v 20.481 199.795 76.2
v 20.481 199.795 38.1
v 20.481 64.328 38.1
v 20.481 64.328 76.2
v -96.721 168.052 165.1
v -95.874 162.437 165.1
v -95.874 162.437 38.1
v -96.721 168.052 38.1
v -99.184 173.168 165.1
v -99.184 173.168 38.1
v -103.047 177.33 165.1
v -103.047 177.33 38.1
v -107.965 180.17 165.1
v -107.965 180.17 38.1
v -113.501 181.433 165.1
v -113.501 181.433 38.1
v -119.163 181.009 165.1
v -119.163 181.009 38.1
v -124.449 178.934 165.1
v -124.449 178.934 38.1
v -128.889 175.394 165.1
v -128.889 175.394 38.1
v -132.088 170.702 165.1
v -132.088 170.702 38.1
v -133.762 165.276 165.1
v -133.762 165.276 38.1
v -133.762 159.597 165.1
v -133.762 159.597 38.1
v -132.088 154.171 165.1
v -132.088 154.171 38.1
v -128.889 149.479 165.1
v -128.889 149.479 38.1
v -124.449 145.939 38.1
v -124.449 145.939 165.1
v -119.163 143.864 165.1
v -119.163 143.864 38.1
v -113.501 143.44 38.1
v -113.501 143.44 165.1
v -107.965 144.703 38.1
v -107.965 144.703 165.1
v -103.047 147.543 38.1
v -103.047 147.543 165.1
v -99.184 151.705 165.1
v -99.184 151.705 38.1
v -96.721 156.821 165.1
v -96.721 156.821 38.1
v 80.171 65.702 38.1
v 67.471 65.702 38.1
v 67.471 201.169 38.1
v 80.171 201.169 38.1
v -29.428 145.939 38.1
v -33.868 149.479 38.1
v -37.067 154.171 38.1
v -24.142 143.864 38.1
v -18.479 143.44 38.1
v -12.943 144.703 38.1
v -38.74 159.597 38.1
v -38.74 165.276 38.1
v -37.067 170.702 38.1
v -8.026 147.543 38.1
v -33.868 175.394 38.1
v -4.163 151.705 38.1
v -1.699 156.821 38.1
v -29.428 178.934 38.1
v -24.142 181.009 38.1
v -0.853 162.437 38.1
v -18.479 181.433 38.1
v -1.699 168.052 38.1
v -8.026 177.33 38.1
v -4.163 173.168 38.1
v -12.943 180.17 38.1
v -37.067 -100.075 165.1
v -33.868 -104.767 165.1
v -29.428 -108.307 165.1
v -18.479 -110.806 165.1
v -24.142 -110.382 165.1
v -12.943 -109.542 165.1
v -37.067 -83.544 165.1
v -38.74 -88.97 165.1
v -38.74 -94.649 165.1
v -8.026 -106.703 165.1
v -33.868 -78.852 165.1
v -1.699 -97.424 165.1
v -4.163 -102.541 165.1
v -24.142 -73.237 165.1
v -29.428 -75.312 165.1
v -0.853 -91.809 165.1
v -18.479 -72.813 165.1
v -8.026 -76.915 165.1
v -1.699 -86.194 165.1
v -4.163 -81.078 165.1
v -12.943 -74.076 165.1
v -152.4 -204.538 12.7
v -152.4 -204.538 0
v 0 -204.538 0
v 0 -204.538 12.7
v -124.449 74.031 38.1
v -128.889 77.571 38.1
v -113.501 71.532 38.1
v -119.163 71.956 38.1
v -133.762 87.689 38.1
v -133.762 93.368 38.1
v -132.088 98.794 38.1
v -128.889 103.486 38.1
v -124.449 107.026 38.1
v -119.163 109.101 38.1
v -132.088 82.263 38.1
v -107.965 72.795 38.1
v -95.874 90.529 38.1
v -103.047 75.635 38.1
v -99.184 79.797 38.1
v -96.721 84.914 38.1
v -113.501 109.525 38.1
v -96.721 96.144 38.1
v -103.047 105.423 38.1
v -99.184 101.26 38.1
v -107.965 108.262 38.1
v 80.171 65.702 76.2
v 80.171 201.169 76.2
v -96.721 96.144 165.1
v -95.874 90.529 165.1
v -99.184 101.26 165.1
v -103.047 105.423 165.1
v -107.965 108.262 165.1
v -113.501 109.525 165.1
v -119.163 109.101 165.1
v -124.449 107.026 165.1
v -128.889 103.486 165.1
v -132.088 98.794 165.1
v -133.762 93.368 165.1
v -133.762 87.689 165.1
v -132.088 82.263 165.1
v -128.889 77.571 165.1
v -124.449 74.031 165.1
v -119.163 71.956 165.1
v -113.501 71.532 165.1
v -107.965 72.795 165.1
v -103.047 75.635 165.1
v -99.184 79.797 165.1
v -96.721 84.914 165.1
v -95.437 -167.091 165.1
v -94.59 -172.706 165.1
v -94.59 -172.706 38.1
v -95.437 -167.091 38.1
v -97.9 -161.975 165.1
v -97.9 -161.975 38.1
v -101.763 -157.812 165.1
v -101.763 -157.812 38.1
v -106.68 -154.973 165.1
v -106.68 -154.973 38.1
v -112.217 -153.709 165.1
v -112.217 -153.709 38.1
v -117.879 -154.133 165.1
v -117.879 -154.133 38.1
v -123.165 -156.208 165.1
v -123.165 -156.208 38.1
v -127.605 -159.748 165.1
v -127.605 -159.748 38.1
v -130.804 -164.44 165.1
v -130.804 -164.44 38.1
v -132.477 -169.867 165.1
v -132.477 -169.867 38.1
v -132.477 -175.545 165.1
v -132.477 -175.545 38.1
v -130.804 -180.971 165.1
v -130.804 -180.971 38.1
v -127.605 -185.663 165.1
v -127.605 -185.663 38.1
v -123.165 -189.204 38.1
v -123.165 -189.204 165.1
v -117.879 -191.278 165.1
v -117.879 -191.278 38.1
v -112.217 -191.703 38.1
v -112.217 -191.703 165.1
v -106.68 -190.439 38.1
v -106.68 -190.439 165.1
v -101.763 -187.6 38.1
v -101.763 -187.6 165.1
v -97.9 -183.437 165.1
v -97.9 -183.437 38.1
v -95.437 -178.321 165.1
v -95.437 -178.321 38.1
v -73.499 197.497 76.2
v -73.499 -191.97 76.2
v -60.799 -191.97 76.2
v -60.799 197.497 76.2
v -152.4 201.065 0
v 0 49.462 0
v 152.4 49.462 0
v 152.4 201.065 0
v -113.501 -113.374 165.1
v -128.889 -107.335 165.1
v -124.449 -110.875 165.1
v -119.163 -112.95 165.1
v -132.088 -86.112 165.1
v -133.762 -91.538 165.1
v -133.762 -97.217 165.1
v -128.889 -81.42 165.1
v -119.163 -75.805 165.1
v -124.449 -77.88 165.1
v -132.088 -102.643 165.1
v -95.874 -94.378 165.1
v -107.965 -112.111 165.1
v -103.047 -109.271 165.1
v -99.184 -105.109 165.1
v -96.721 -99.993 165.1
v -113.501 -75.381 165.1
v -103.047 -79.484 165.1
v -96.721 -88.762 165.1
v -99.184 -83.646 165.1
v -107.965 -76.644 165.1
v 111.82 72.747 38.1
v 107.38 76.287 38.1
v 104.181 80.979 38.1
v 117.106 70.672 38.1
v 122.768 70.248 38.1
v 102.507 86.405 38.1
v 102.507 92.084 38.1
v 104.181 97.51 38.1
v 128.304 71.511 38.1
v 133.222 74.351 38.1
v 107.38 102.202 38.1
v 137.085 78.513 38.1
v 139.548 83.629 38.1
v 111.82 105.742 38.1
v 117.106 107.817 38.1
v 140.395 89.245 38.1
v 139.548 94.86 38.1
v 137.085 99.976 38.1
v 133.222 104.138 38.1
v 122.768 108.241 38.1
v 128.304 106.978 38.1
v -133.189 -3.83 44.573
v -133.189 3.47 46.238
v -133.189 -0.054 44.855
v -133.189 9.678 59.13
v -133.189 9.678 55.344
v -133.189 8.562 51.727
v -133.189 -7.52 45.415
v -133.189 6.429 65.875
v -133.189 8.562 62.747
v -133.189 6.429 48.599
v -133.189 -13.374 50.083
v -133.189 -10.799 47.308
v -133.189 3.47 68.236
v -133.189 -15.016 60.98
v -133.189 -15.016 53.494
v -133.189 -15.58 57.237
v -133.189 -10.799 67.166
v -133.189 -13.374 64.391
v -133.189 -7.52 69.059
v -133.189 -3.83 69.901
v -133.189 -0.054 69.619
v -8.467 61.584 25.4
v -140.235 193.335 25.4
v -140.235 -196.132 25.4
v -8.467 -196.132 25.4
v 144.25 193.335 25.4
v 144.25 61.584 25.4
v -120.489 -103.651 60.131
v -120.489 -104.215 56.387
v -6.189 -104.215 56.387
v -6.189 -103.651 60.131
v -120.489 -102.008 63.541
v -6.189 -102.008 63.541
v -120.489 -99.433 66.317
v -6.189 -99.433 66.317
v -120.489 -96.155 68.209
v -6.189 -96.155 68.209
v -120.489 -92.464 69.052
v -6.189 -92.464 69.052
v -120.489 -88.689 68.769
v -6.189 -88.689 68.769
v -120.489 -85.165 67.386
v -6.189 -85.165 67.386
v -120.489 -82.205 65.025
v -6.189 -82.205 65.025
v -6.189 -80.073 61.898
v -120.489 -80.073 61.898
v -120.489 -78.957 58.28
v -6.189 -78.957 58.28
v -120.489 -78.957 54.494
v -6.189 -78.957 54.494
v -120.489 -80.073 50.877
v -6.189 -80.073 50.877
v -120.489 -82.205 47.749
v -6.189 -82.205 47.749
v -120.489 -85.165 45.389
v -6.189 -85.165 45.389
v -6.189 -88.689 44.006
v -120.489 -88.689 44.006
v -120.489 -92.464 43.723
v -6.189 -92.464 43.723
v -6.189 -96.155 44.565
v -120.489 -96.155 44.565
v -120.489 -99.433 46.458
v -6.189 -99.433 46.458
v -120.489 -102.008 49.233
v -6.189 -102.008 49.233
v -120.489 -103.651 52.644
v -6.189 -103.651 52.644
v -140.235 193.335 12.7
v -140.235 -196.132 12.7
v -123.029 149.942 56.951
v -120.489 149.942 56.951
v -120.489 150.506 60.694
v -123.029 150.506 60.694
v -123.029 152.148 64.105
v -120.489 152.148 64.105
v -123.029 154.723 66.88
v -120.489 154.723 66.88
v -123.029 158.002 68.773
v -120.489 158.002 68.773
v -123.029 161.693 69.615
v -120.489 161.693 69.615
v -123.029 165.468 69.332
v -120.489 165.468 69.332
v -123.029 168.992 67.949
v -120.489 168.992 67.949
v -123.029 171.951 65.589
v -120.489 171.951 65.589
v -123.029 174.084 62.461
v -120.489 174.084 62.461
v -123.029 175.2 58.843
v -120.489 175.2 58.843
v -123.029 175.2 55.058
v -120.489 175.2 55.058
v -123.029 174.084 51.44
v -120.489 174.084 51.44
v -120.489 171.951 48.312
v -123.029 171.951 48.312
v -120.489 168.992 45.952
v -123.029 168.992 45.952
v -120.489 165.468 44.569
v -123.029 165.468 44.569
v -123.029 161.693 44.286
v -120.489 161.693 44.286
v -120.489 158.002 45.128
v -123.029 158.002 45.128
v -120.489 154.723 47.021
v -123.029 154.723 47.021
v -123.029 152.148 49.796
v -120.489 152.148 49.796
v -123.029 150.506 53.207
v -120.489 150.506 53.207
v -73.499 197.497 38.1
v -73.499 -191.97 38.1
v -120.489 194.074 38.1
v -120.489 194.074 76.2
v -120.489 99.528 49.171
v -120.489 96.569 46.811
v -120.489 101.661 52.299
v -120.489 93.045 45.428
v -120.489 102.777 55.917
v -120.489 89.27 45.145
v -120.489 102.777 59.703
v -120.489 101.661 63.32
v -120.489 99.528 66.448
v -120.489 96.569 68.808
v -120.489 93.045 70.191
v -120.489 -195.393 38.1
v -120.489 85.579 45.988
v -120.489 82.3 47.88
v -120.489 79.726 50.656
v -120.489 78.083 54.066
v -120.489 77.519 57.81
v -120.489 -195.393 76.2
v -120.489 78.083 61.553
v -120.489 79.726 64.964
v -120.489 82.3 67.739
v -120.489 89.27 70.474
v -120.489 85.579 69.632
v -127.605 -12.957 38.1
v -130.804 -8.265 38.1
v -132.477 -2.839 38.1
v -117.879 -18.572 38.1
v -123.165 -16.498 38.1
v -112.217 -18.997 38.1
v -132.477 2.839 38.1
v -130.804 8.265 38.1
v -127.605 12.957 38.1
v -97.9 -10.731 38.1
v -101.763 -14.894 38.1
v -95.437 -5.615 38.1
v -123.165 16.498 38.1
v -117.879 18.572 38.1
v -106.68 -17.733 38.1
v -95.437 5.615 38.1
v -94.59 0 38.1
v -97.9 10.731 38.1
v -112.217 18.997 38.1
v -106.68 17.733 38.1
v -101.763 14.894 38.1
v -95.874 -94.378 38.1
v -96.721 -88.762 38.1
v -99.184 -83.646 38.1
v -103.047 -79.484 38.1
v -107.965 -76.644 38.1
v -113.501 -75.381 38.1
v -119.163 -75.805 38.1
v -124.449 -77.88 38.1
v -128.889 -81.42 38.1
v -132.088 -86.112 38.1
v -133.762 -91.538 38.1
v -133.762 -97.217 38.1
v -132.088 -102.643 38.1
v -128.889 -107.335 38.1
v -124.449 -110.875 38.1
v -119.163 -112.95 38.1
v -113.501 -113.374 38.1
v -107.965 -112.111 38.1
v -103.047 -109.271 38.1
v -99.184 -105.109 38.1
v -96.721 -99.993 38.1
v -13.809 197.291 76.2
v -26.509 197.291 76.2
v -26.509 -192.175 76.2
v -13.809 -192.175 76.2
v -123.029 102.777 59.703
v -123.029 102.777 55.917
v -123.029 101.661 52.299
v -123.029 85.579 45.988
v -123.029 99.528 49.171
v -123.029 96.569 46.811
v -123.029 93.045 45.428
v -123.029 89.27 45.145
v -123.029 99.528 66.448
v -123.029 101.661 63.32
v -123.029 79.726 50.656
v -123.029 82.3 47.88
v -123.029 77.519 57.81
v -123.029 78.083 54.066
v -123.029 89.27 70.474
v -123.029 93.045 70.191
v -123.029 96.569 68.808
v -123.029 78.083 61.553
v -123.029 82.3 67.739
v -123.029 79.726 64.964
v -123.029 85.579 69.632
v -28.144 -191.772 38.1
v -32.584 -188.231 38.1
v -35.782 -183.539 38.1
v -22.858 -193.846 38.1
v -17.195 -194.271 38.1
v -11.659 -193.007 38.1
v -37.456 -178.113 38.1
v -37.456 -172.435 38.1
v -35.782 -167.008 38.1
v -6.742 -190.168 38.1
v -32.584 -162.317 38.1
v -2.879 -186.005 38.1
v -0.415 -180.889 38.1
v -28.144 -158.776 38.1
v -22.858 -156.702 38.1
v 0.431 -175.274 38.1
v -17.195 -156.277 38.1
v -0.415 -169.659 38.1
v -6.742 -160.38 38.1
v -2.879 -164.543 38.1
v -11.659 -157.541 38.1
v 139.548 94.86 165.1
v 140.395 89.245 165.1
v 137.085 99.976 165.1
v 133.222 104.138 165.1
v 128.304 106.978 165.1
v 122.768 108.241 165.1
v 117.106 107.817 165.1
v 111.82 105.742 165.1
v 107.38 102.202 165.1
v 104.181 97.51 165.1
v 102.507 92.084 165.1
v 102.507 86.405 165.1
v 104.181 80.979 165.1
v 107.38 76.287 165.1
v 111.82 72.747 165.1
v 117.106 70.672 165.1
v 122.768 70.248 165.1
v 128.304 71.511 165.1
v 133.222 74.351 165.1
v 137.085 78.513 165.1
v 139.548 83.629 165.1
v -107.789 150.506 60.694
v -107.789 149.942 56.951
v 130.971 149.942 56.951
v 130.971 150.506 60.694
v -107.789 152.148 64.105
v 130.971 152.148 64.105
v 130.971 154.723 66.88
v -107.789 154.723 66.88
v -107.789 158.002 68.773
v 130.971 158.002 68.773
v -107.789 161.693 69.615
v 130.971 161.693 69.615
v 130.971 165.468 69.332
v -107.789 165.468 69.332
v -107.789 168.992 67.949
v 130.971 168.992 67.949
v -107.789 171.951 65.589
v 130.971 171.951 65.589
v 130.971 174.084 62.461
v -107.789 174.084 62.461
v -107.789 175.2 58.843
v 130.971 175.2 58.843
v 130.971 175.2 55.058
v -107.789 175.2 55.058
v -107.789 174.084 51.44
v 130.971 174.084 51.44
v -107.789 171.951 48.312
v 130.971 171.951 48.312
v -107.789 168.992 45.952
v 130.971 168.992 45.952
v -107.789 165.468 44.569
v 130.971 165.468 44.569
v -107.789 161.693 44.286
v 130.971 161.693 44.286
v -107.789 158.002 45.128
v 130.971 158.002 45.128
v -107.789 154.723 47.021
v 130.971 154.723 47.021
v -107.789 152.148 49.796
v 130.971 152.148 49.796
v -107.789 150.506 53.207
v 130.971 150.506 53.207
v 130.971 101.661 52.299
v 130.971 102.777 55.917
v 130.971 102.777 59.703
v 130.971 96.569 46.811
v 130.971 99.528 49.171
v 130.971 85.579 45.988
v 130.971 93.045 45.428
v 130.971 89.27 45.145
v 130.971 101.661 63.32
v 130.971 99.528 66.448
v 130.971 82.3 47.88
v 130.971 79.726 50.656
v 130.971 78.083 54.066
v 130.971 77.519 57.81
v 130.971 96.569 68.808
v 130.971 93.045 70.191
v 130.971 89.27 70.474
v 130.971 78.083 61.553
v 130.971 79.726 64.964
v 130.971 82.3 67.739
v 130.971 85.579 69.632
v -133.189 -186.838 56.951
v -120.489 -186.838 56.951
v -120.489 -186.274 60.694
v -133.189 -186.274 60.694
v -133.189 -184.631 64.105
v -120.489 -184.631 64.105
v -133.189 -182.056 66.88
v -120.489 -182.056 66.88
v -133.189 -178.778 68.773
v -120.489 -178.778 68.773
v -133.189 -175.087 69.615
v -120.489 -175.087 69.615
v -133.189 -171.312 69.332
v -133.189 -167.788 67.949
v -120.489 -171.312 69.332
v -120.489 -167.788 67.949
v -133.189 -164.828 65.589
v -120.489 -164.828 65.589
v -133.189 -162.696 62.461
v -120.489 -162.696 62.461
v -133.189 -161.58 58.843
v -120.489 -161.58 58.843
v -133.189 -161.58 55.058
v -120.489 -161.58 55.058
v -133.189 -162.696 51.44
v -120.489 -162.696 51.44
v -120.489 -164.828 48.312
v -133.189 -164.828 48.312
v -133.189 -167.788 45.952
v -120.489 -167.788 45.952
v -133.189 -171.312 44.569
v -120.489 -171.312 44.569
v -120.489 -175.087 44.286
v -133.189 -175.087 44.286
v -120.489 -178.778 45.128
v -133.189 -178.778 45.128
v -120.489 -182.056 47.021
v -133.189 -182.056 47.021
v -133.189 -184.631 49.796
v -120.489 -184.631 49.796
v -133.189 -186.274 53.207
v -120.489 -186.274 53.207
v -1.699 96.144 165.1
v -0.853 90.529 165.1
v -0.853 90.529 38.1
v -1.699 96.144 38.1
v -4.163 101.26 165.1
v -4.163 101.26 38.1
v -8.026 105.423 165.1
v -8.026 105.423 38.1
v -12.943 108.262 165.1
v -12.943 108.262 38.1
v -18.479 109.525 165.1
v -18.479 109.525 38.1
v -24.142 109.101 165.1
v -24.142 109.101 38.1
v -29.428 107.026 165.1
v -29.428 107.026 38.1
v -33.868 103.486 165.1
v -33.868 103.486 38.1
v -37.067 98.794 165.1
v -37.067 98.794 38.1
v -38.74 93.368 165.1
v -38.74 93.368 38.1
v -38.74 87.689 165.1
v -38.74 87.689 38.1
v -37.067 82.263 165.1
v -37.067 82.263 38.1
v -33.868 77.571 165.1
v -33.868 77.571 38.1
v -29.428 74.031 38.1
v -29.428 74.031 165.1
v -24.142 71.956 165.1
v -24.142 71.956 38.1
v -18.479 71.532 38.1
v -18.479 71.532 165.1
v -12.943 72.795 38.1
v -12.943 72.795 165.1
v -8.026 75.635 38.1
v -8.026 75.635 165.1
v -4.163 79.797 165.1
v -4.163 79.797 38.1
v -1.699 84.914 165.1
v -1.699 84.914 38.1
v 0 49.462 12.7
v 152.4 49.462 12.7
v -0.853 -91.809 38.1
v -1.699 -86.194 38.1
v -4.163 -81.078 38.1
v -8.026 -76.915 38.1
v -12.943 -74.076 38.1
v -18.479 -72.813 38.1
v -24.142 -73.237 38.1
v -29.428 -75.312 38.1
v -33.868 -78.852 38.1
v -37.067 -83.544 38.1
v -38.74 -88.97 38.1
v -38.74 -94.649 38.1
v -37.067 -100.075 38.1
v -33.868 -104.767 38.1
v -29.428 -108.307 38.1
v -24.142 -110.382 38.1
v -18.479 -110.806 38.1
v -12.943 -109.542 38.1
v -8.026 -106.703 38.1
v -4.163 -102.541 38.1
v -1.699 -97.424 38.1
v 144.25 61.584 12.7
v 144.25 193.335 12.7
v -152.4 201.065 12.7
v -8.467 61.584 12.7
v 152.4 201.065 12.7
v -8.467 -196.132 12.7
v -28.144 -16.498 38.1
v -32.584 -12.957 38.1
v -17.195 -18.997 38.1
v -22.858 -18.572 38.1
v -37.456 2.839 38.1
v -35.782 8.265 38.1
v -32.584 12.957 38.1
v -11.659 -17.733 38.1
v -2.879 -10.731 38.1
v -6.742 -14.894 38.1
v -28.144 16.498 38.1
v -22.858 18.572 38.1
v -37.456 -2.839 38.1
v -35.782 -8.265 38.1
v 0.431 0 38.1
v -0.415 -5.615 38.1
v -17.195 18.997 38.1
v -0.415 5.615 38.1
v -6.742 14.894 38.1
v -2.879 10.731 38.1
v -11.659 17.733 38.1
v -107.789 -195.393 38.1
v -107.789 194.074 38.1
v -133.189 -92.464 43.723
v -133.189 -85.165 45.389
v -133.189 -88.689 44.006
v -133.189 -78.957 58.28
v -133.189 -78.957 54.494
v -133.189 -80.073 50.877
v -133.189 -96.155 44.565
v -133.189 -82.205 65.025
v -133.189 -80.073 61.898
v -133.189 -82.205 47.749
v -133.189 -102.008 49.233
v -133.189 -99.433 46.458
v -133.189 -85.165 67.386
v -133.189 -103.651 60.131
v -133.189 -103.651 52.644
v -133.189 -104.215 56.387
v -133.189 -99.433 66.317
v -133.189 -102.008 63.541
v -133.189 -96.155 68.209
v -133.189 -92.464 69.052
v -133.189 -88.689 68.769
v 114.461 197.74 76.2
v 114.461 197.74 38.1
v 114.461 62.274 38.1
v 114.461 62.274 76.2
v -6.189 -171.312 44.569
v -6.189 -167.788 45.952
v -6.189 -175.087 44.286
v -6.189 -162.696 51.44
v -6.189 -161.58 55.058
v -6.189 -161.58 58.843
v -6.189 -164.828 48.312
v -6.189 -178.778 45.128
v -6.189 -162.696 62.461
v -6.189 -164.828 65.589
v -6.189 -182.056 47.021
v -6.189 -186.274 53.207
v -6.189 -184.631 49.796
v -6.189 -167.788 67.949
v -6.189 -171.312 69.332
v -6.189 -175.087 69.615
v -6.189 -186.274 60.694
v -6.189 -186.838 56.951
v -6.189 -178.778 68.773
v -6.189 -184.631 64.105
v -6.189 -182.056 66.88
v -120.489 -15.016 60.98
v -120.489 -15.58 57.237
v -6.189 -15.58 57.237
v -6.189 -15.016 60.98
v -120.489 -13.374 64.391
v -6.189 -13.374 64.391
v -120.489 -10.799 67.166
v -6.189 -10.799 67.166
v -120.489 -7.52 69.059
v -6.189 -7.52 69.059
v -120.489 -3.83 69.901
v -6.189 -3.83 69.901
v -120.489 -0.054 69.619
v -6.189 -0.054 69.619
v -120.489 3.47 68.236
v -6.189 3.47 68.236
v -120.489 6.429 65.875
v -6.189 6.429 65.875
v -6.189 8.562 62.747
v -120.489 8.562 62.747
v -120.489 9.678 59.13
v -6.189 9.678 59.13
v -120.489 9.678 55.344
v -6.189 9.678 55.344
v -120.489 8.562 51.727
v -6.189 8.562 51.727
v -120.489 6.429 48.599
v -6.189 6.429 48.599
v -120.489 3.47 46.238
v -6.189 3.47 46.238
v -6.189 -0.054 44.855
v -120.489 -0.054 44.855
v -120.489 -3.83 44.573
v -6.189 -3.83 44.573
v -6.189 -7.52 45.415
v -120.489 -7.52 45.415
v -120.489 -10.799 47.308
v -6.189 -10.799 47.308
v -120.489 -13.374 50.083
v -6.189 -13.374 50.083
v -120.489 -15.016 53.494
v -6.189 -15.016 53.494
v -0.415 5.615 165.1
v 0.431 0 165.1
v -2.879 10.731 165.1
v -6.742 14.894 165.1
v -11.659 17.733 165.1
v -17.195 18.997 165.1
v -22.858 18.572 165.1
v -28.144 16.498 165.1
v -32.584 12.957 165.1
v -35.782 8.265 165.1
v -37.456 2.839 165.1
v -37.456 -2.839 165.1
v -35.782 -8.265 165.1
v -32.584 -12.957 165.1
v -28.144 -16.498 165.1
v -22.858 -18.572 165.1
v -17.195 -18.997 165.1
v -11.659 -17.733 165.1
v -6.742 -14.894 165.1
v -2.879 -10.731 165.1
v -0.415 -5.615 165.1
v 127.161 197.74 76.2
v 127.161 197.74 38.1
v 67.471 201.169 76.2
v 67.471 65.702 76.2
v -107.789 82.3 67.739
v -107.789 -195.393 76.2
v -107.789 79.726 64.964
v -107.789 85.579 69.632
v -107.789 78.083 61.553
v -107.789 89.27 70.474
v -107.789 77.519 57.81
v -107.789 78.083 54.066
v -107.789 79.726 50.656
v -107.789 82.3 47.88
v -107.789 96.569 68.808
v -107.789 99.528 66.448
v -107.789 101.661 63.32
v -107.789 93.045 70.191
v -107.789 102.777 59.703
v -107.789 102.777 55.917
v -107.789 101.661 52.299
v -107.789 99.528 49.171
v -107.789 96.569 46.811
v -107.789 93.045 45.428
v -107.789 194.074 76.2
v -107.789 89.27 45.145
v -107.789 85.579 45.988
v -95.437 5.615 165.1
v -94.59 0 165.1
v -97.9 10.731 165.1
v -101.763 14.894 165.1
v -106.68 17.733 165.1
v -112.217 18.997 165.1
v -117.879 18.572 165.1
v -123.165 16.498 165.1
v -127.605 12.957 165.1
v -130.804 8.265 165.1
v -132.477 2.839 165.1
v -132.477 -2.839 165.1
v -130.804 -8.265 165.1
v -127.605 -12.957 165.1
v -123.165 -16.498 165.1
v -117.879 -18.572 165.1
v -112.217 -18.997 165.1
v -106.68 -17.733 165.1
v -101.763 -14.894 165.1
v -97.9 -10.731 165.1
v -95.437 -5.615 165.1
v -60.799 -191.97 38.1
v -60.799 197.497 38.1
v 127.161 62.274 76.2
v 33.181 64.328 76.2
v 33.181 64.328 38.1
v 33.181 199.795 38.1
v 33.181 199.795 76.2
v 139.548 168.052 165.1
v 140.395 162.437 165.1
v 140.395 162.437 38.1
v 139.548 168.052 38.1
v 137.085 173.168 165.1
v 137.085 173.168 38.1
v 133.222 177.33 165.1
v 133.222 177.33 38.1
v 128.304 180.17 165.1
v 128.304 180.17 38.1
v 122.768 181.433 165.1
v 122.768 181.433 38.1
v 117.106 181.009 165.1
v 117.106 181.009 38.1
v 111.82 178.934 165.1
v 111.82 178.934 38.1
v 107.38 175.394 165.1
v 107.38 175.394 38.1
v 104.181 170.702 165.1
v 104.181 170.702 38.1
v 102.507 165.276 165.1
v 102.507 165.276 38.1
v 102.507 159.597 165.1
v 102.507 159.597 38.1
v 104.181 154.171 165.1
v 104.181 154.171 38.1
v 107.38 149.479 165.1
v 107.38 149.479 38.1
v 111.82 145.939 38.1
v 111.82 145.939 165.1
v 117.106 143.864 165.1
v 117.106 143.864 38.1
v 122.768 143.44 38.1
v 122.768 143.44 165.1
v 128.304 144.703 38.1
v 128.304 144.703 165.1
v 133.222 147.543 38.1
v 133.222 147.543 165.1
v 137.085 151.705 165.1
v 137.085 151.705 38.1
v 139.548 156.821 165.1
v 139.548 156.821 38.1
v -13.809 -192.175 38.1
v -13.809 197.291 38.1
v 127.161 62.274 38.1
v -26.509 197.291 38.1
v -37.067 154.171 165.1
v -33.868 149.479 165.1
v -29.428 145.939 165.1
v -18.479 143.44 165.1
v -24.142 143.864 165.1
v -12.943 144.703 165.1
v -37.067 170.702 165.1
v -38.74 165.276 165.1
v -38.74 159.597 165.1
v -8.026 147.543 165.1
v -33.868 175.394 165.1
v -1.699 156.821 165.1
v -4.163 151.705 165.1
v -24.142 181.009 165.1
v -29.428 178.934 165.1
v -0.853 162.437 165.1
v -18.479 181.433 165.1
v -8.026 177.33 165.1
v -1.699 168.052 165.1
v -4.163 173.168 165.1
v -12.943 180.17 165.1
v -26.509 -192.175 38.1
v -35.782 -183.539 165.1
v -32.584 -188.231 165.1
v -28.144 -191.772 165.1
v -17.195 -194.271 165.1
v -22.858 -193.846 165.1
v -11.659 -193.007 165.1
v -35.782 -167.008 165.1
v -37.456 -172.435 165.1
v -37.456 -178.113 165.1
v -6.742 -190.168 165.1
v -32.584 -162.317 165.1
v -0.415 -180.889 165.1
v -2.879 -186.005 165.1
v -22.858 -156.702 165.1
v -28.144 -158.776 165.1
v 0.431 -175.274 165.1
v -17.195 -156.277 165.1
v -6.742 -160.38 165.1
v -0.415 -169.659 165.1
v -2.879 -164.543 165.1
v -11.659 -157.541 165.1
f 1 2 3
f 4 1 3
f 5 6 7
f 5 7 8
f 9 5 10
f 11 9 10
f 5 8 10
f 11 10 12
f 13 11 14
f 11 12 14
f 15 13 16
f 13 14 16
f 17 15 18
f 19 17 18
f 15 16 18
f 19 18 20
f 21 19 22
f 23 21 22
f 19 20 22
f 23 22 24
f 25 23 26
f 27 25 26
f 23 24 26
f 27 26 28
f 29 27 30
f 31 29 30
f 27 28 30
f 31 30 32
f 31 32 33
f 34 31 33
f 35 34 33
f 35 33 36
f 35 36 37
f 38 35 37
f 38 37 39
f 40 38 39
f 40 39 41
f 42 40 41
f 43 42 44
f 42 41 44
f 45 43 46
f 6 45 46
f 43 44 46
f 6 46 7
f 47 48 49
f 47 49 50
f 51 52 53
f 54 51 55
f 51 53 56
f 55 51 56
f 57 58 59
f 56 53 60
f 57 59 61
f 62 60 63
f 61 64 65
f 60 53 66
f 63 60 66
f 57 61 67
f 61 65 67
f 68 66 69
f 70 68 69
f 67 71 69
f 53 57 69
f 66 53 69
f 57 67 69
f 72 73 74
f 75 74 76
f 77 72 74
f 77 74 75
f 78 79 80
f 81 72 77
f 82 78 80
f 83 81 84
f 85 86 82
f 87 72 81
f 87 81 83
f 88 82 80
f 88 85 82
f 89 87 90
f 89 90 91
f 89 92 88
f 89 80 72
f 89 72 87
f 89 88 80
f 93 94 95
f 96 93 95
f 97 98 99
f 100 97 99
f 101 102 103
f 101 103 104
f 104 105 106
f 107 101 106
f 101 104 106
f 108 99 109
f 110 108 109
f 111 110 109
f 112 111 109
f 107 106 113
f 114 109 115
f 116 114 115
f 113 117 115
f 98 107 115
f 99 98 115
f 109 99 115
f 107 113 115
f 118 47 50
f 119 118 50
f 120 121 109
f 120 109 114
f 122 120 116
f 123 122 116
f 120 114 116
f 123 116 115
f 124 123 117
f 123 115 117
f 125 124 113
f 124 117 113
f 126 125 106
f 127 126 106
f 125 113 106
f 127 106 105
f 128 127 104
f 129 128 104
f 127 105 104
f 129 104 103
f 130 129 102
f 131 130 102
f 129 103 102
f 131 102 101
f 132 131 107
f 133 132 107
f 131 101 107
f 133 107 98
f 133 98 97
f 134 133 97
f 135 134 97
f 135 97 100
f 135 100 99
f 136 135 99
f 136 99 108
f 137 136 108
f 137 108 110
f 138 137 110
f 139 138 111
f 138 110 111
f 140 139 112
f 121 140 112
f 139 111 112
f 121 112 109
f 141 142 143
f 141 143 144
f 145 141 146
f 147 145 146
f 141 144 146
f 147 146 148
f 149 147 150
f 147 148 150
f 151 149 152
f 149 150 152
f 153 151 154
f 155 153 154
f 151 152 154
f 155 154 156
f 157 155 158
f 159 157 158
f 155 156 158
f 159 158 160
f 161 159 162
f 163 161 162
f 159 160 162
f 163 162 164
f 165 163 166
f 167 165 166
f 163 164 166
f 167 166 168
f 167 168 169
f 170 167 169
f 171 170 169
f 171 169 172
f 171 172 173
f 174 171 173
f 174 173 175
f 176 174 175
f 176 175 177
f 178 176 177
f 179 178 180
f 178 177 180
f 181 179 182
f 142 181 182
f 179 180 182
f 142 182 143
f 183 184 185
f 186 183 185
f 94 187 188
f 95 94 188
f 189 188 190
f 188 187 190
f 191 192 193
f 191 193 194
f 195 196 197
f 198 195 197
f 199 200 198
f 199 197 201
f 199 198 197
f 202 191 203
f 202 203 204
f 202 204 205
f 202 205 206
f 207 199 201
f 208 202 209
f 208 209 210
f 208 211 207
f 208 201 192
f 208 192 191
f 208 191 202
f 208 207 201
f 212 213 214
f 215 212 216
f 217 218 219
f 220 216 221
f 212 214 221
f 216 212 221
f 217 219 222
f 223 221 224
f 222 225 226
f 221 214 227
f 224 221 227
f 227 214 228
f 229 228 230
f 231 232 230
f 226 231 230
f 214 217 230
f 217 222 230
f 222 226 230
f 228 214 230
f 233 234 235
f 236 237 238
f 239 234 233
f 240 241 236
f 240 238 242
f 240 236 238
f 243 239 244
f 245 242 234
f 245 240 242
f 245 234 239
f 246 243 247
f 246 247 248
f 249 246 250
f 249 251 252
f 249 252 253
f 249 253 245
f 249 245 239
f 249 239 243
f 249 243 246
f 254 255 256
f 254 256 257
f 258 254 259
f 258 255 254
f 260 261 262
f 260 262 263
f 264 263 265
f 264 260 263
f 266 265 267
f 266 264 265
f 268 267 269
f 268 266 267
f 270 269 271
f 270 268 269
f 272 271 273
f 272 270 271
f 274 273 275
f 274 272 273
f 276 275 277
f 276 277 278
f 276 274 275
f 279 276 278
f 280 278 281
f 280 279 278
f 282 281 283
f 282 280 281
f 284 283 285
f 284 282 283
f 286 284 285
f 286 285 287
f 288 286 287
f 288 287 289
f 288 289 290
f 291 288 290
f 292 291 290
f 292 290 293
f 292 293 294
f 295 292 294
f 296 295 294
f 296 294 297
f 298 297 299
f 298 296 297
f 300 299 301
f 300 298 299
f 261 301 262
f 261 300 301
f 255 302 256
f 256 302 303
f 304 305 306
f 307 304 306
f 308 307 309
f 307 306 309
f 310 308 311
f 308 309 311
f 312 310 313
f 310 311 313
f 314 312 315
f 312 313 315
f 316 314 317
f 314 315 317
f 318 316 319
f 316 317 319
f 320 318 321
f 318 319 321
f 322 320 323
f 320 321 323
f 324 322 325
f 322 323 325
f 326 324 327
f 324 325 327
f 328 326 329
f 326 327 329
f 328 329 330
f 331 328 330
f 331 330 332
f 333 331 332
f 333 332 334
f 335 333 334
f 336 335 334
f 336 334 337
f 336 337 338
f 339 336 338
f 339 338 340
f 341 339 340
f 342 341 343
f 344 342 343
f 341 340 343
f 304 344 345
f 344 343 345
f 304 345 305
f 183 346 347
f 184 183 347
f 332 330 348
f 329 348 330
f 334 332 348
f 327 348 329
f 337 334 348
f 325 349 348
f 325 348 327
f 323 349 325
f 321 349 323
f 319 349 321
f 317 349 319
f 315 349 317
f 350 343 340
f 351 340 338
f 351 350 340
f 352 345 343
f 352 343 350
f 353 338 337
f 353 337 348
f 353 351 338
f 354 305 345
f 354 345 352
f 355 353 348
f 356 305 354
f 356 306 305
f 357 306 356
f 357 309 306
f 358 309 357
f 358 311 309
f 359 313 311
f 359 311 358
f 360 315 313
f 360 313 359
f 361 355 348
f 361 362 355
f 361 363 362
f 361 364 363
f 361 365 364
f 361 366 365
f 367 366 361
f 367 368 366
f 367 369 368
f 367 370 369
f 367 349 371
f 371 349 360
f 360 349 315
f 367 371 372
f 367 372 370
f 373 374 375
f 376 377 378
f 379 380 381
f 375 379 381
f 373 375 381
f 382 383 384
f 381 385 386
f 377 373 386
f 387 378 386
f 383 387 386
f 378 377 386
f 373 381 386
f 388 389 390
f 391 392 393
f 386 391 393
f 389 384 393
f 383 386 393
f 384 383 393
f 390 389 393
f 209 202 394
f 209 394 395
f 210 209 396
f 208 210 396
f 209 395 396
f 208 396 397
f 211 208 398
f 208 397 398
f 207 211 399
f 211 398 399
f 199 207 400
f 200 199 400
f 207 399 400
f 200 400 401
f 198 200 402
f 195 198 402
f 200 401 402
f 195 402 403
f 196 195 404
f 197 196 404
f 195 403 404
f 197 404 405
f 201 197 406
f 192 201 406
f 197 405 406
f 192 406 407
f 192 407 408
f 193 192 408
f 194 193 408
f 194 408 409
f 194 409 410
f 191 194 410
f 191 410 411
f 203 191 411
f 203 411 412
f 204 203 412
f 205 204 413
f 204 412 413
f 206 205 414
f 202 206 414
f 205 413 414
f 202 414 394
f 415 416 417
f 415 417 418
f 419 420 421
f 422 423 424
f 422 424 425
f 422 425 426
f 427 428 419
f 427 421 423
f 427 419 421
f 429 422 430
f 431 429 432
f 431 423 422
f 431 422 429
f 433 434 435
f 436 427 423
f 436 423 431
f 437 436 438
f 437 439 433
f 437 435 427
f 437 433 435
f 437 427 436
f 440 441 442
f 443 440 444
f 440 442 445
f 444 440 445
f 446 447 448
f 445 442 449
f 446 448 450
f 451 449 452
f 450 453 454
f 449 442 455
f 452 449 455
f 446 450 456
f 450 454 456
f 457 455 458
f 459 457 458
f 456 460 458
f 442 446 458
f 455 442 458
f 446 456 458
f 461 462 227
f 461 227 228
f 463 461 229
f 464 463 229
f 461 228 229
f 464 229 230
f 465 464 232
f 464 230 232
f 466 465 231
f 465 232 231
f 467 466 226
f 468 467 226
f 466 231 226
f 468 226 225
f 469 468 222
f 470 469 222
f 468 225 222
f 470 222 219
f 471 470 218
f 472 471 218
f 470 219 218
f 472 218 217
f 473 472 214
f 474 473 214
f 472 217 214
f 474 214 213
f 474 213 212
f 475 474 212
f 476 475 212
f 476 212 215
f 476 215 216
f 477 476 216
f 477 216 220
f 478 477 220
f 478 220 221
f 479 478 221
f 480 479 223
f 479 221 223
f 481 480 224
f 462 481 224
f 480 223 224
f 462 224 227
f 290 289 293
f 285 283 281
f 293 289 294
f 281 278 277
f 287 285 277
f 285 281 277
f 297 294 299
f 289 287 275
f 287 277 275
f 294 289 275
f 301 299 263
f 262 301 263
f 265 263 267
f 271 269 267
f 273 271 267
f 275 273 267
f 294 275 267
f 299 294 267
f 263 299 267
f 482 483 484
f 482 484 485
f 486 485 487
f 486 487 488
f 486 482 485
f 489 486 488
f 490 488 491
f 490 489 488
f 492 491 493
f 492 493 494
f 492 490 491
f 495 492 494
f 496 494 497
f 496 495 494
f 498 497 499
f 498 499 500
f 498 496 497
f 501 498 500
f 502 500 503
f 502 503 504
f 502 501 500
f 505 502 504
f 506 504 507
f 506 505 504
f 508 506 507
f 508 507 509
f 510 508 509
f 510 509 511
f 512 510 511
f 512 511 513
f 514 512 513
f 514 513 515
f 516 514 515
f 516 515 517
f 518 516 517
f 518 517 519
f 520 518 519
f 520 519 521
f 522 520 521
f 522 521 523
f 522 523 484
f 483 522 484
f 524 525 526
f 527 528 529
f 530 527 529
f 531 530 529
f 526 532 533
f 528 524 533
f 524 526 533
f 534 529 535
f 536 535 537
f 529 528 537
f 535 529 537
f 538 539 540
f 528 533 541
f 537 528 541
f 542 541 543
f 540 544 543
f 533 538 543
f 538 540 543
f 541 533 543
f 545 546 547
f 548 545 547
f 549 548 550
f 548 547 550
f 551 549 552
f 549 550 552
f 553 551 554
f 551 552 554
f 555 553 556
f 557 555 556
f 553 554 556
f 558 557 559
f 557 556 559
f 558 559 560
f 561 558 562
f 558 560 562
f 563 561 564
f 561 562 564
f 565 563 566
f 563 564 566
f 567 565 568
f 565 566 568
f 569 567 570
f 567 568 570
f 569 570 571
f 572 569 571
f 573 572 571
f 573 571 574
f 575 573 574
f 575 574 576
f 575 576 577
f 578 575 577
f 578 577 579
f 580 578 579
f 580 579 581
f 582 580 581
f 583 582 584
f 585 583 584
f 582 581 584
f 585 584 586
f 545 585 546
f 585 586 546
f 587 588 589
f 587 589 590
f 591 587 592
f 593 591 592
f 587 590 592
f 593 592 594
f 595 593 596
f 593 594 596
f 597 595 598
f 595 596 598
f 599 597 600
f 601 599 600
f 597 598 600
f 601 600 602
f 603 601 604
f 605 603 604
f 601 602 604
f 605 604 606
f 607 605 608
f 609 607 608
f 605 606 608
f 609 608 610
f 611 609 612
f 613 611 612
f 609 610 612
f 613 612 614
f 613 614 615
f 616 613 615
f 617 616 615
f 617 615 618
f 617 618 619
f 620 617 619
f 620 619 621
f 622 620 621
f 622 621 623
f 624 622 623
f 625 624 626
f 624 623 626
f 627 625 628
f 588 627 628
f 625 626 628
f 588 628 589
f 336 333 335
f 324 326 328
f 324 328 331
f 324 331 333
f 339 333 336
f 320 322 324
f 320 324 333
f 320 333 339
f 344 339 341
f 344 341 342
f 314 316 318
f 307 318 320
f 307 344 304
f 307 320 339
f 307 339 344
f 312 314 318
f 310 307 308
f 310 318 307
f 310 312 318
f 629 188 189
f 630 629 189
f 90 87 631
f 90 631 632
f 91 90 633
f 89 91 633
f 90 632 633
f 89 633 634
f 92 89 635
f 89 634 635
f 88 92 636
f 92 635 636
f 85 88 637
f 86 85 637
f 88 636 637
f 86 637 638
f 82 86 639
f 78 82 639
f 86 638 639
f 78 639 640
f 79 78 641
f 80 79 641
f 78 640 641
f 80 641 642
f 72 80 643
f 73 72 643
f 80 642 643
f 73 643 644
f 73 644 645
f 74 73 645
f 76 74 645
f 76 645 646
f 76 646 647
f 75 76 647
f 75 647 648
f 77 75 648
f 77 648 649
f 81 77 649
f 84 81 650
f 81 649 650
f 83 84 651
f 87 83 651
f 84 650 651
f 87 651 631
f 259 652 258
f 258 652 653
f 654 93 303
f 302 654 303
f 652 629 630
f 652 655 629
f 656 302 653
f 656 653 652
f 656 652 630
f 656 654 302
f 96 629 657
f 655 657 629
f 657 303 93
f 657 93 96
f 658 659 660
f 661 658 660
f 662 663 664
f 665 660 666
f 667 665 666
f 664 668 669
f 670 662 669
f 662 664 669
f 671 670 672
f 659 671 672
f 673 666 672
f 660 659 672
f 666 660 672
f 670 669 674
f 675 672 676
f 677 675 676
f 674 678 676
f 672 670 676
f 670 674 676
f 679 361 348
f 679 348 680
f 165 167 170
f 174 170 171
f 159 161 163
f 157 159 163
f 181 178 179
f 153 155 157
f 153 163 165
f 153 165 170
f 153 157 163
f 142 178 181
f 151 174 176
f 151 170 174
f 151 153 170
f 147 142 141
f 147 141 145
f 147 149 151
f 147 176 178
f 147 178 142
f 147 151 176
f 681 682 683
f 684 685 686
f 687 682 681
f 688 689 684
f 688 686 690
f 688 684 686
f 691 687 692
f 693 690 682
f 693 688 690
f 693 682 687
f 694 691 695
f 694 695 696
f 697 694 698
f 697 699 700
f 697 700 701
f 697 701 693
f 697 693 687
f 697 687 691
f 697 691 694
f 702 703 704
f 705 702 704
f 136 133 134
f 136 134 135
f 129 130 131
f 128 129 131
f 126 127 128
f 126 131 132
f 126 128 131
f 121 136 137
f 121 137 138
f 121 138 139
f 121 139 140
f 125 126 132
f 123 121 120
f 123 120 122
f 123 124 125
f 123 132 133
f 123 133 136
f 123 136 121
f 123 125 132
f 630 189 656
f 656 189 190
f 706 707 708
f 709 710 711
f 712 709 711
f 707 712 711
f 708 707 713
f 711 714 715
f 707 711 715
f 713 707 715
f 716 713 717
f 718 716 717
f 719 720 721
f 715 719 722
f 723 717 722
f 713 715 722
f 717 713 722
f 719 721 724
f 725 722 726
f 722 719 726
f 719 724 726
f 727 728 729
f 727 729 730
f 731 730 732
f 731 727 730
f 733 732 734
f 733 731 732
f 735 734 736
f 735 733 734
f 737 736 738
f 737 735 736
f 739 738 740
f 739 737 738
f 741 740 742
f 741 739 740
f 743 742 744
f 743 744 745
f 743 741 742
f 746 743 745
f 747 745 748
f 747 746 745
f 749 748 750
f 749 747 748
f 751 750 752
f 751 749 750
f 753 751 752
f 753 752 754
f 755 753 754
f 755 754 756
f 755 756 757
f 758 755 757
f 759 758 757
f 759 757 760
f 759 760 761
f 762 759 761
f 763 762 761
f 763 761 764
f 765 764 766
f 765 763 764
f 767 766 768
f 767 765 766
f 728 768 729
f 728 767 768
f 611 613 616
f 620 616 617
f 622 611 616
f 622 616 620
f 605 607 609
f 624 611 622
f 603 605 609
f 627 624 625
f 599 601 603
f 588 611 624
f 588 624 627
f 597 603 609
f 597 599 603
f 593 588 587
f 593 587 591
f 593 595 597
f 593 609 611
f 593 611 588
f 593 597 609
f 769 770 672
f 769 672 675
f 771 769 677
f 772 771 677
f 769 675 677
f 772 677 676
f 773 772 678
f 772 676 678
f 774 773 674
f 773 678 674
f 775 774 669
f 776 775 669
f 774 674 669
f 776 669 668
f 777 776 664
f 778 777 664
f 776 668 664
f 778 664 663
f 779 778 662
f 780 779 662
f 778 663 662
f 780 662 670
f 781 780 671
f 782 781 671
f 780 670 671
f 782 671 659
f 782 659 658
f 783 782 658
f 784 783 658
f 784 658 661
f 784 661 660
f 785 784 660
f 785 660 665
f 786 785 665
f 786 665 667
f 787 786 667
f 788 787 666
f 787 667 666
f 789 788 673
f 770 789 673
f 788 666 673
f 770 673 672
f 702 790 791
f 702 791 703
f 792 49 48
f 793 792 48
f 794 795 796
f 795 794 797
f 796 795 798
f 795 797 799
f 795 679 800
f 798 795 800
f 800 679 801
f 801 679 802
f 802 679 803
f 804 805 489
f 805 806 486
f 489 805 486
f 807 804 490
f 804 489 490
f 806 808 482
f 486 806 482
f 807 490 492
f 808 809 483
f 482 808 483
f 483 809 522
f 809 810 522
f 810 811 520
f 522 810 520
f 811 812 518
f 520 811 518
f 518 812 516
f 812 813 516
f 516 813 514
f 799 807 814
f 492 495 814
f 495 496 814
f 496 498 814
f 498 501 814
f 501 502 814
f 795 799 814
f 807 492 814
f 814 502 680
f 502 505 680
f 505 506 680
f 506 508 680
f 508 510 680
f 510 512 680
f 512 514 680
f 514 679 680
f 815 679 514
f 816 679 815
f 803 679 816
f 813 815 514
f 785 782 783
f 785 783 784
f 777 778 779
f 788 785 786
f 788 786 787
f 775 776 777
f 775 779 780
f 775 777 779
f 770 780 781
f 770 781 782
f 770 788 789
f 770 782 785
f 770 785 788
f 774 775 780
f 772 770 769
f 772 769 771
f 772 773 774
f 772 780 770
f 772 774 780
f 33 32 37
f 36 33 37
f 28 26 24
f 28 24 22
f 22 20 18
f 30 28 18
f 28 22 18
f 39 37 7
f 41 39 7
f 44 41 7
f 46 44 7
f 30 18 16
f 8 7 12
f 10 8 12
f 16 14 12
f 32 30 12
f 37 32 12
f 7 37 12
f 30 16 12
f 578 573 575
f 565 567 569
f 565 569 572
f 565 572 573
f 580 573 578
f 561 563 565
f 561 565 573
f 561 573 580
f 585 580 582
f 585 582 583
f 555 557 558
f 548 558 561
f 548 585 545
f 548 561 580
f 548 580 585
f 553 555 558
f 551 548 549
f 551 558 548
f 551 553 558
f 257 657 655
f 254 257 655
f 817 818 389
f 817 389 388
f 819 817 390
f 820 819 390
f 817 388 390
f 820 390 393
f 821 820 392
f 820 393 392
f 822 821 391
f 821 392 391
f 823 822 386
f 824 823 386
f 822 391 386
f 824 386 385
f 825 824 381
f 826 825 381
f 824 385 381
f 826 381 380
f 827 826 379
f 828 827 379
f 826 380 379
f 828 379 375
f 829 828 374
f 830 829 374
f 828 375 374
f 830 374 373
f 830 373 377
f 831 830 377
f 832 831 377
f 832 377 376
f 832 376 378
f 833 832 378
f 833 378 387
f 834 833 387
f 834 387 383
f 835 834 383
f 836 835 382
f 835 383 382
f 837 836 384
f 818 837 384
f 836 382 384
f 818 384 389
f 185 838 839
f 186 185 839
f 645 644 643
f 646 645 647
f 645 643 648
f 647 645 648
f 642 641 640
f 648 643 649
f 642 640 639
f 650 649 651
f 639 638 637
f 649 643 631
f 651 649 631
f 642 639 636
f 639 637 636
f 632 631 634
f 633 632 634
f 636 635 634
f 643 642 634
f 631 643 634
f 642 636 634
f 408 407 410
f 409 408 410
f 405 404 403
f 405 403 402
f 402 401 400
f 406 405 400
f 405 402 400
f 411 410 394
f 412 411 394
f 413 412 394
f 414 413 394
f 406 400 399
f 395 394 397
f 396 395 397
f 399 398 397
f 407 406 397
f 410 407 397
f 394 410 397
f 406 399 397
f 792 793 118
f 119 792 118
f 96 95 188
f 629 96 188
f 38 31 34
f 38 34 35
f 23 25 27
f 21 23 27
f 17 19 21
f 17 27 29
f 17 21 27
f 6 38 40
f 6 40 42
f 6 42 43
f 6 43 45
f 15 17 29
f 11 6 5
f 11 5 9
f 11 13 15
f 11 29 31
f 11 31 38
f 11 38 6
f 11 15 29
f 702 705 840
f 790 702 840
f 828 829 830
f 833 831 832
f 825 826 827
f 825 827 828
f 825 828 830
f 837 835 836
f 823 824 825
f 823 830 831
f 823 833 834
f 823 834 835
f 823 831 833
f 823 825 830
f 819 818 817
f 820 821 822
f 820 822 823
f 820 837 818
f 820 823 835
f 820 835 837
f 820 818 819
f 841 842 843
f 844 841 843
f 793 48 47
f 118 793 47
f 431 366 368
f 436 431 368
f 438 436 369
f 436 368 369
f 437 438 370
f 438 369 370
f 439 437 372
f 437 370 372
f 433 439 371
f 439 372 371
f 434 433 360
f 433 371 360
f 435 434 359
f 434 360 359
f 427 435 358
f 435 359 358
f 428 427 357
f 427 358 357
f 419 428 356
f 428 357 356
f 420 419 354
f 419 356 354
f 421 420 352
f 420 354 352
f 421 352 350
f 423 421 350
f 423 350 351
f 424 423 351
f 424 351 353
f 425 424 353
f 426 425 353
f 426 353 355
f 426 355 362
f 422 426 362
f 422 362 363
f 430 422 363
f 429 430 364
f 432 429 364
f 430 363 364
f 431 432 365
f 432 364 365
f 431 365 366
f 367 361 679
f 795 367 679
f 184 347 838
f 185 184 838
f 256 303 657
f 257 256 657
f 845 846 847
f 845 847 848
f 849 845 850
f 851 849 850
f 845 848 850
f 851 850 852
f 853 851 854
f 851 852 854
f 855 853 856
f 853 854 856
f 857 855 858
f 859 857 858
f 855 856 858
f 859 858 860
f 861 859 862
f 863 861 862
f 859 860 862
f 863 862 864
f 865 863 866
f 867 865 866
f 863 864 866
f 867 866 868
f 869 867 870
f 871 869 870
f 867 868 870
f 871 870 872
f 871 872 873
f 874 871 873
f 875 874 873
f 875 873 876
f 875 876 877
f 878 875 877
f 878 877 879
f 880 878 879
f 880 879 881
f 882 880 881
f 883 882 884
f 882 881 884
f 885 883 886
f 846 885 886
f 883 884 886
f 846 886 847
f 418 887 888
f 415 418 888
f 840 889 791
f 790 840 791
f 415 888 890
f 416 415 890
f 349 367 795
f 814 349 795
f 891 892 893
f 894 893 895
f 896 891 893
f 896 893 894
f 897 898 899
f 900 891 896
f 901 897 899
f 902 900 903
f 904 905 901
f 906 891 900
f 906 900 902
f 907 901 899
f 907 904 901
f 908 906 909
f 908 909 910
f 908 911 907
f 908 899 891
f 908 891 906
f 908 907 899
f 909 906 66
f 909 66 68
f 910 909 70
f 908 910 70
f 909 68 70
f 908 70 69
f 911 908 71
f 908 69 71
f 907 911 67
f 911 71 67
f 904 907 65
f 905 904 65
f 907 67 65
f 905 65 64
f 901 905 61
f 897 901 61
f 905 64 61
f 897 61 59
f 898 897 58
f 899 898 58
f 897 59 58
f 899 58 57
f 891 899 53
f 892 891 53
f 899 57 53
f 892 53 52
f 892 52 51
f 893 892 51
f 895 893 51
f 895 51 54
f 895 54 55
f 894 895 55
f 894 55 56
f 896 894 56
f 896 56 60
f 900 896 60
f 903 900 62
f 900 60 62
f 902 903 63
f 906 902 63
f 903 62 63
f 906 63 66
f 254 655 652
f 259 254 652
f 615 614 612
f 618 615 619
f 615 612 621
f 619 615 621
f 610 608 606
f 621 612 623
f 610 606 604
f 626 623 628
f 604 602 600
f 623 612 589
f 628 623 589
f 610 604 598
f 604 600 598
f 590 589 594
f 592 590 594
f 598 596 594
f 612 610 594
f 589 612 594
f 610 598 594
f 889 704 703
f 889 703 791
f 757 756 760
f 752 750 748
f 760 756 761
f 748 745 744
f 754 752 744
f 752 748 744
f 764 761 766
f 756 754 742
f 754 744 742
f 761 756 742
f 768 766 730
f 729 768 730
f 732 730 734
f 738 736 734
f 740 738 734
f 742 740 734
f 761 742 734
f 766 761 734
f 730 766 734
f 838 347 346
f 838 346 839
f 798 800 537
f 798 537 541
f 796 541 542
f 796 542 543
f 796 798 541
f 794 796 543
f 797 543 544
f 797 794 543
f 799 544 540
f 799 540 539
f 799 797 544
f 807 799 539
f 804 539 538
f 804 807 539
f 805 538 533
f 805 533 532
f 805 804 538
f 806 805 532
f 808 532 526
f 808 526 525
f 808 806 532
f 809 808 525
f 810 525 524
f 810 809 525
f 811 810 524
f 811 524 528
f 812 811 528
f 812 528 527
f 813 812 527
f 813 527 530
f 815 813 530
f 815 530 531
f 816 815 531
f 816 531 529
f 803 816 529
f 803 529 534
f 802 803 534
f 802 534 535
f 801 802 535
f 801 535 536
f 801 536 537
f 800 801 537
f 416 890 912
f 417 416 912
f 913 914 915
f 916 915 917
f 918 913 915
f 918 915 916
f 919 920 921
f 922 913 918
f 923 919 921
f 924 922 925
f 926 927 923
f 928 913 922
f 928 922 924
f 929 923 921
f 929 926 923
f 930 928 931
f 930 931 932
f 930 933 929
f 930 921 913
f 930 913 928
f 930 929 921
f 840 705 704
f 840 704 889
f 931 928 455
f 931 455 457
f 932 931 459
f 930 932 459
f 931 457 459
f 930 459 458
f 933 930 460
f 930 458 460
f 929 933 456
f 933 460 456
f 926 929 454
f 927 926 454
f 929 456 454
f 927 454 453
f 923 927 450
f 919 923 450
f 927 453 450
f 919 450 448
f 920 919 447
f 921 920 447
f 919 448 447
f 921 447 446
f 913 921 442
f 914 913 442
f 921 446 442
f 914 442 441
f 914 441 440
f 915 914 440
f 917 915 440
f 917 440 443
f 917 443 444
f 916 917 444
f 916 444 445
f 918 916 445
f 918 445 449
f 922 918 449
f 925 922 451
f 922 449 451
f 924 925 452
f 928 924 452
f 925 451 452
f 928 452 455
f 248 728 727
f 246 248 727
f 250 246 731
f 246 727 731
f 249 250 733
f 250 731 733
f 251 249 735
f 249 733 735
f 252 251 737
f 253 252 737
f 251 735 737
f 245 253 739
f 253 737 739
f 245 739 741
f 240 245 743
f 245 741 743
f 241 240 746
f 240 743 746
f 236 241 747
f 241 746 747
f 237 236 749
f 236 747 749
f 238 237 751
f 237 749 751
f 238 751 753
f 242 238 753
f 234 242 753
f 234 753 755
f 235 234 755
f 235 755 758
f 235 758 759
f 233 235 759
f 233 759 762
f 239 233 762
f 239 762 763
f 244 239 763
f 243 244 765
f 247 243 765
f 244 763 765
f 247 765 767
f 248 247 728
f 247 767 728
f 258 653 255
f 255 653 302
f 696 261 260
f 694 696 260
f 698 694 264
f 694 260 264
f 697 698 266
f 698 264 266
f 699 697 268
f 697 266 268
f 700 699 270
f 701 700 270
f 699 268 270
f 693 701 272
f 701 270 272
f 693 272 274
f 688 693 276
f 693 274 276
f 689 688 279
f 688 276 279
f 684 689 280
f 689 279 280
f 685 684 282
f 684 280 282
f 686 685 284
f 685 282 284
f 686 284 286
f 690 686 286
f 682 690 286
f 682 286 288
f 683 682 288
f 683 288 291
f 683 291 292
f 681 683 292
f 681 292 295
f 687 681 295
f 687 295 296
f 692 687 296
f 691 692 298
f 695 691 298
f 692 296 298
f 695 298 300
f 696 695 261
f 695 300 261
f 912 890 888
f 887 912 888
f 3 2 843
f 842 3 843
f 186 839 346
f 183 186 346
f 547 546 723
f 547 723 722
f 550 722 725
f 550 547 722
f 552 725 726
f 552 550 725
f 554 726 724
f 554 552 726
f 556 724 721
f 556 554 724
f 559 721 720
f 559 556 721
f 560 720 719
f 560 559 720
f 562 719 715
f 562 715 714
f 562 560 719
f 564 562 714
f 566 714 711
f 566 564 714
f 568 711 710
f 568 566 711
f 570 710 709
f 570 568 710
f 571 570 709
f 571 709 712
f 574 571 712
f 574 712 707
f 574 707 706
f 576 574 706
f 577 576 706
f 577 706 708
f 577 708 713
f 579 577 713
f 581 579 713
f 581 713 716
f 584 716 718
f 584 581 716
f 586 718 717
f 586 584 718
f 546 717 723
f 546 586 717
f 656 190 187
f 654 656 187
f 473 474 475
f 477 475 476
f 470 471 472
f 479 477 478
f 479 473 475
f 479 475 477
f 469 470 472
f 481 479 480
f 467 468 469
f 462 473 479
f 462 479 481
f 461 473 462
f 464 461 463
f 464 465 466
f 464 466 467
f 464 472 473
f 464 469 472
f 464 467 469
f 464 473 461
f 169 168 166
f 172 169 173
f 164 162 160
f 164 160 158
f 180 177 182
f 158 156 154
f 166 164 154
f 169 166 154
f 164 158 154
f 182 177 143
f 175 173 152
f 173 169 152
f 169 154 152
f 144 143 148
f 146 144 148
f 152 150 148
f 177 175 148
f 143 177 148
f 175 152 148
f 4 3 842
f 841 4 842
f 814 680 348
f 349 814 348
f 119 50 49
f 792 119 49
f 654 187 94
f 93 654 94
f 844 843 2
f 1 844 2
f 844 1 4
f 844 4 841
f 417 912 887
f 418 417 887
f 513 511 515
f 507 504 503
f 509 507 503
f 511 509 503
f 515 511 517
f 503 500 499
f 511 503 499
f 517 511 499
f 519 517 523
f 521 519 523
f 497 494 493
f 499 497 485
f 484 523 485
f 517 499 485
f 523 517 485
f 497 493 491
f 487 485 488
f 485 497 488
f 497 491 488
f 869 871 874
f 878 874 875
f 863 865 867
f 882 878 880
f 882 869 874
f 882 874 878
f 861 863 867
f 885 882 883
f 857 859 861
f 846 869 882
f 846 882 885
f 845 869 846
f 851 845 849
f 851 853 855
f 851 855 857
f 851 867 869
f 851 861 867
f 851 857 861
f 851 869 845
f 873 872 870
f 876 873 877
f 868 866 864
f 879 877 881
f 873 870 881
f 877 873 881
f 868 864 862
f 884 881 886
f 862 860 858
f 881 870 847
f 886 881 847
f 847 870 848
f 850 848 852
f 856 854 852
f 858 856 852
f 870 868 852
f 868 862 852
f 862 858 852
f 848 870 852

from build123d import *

# Parameters (mm, degrees)
F2_DEPTH      = 12.7
F3_DEPTH      = 25.4
F6_DEPTH      = 38.1
F7_R          = 12.7
F8_DEPTH      = 251.46
F8_DEPTH_BACK = 2.54
F9_DEPTH      = 114.3
F9_DEPTH_BACK = 12.7
F10_R         = 19.05
F11_DEPTH     = 127


with BuildPart() as f2:
    # F0 (on Top) → F2 (new body)
    with BuildSketch(Plane.XY):
        Polygon((152.4, 201.0648879761), (-152.4, 201.0648879761), (-152.4, -204.5382511029), (0, -204.5382511029), (0, 49.4617488971), (152.4, 49.4617488971), align=None)
    extrude(amount=F2_DEPTH)

    # F1 (on Top) → F3 (join)
    with BuildSketch(Plane.XY):
        Polygon((144.2498117685, 193.3349314054), (-140.2351799329, 193.3349314054), (-140.2351799329, -196.1317352613), (-8.4666666667, -196.1317352613), (-8.4666666667, 61.5842622797), (0, 61.5842622797), (144.2498117685, 61.5842622797), align=None)
    extrude(amount=F3_DEPTH)


with BuildPart() as f6:
    # F5 (on offset) → F6 (new body)
    with BuildSketch(Plane.XY.offset(38.1)):
        Polygon((-73.498930751, 197.4967206399), (-73.498930751, 27.8196092695), (-73.498930751, -191.9699460268), (-60.798930751, -191.9699460268), (-60.798930751, 127.6573985815), (-60.798930751, 197.4967206399), align=None)
    extrude(amount=F6_DEPTH)


with BuildPart() as f6b:
    # F5 (on offset) → F6, piece 2 (new body)
    with BuildSketch(Plane.XY.offset(38.1)):
        Polygon((-107.788930751, 194.0739942034), (-120.488930751, 194.0739942034), (-120.488930751, -195.3926724633), (-107.788930751, -195.3926724633), (-107.788930751, 27.8196092695), align=None)
    extrude(amount=F6_DEPTH)

    # F7 (on face) → F8 (join, two sides)
    with BuildSketch(Plane(origin=(-120.488930751, 0, 0), x_dir=(0, -1, 0), z_dir=(-1, 0, 0))) as f8_sk:
        with Locations((-90.2187364873, 57.8096798096)):
            Circle(F7_R)
        with Locations((-162.6416483043, 56.950548049)):
            Circle(F7_R)
    extrude(amount=-F8_DEPTH)
    extrude(f8_sk.sketch, amount=F8_DEPTH_BACK)


with BuildPart() as f6c:
    # F5 (on offset) → F6, piece 3 (new body)
    with BuildSketch(Plane.XY.offset(38.1)):
        Polygon((-26.508930751, 197.2913677375), (-26.508930751, 127.6573985815), (-26.508930751, -192.1752989292), (-13.808930751, -192.1752989292), (-13.808930751, 169.3038642406), (-13.808930751, 197.2913677375), align=None)
    extrude(amount=F6_DEPTH)


with BuildPart() as f6d:
    # F5 (on offset) → F6, piece 4 (new body)
    with BuildSketch(Plane.XY.offset(38.1)):
        Polygon((20.481069249, 199.795165805), (20.481069249, 169.3038642406), (20.481069249, 64.3284991384), (33.181069249, 64.3284991384), (33.181069249, 132.0618324717), (33.181069249, 199.795165805), align=None)
    extrude(amount=F6_DEPTH)


with BuildPart() as f6e:
    # F5 (on offset) → F6, piece 5 (new body)
    with BuildSketch(Plane.XY.offset(38.1)):
        Polygon((67.471069249, 201.1690603177), (67.471069249, 132.0618324717), (67.471069249, 65.702393651), (80.171069249, 65.702393651), (80.171069249, 154.0302634239), (80.171069249, 201.1690603177), align=None)
    extrude(amount=F6_DEPTH)


with BuildPart() as f6f:
    # F5 (on offset) → F6, piece 6 (new body)
    with BuildSketch(Plane.XY.offset(38.1)):
        Polygon((114.461069249, 197.7404037098), (114.461069249, 154.0302634239), (114.461069249, 62.2737370431), (127.161069249, 62.2737370431), (127.161069249, 197.7404037098), align=None)
    extrude(amount=F6_DEPTH)


with BuildPart() as f9:
    # F7 (on face) → F9 (new body, two sides)
    with BuildSketch(Plane(origin=(-120.488930751, 0, 0), x_dir=(0, -1, 0), z_dir=(-1, 0, 0))) as f9_sk:
        with Locations((174.1378468705, 56.9505412799)):
            Circle(F7_R)
    extrude(amount=-F9_DEPTH)
    extrude(f9_sk.sketch, amount=F9_DEPTH_BACK)


with BuildPart() as f9b:
    # F7 (on face) → F9, piece 2 (new body, two sides)
    with BuildSketch(Plane(origin=(-120.488930751, 0, 0), x_dir=(0, -1, 0), z_dir=(-1, 0, 0))) as f9_2_sk:
        with Locations((2.8804370862, 57.2369977062)):
            Circle(F7_R)
    extrude(amount=-F9_DEPTH)
    extrude(f9_2_sk.sketch, amount=F9_DEPTH_BACK)


with BuildPart() as f9c:
    # F7 (on face) → F9, piece 3 (new body, two sides)
    with BuildSketch(Plane(origin=(-120.488930751, 0, 0), x_dir=(0, -1, 0), z_dir=(-1, 0, 0))) as f9_3_sk:
        with Locations((91.5151780908, 56.387302765)):
            Circle(F7_R)
    extrude(amount=-F9_DEPTH)
    extrude(f9_3_sk.sketch, amount=F9_DEPTH_BACK)


with BuildPart() as f11:
    # F10 (on offset) → F11 (new body)
    with BuildSketch(Plane.XY.offset(38.1)):
        with Locations((-113.6402189732, -172.7057695389)):
            Circle(F10_R)
    extrude(amount=F11_DEPTH)


with BuildPart() as f11b:
    # F10 (on offset) → F11, piece 2 (new body)
    with BuildSketch(Plane.XY.offset(38.1)):
        with Locations((-114.9242892861, -94.377502799)):
            Circle(F10_R)
    extrude(amount=F11_DEPTH)


with BuildPart() as f11c:
    # F10 (on offset) → F11, piece 3 (new body)
    with BuildSketch(Plane.XY.offset(38.1)):
        with Locations((-18.6190102249, -175.273925066)):
            Circle(F10_R)
    extrude(amount=F11_DEPTH)


with BuildPart() as f11d:
    # F10 (on offset) → F11, piece 4 (new body)
    with BuildSketch(Plane.XY.offset(38.1)):
        with Locations((-19.9030805379, -91.8093547225)):
            Circle(F10_R)
    extrude(amount=F11_DEPTH)


with BuildPart() as f11e:
    # F10 (on offset) → F11, piece 5 (new body)
    with BuildSketch(Plane.XY.offset(38.1)):
        with Locations((-18.6190102249, 0)):
            Circle(F10_R)
    extrude(amount=F11_DEPTH)


with BuildPart() as f11f:
    # F10 (on offset) → F11, piece 6 (new body)
    with BuildSketch(Plane.XY.offset(38.1)):
        with Locations((-113.6402189732, 0)):
            Circle(F10_R)
    extrude(amount=F11_DEPTH)


with BuildPart() as f11g:
    # F10 (on offset) → F11, piece 7 (new body)
    with BuildSketch(Plane.XY.offset(38.1)):
        with Locations((-114.9242892861, 90.5286222696)):
            Circle(F10_R)
    extrude(amount=F11_DEPTH)


with BuildPart() as f11h:
    # F10 (on offset) → F11, piece 8 (new body)
    with BuildSketch(Plane.XY.offset(38.1)):
        with Locations((-114.9242892861, 162.4365597963)):
            Circle(F10_R)
    extrude(amount=F11_DEPTH)


with BuildPart() as f11i:
    # F10 (on offset) → F11, piece 9 (new body)
    with BuildSketch(Plane.XY.offset(38.1)):
        with Locations((-19.9030805379, 162.4365597963)):
            Circle(F10_R)
    extrude(amount=F11_DEPTH)


with BuildPart() as f11j:
    # F10 (on offset) → F11, piece 10 (new body)
    with BuildSketch(Plane.XY.offset(38.1)):
        with Locations((-19.9030805379, 90.5286222696)):
            Circle(F10_R)
    extrude(amount=F11_DEPTH)


with BuildPart() as f11k:
    # F10 (on offset) → F11, piece 11 (new body)
    with BuildSketch(Plane.XY.offset(38.1)):
        with Locations((121.3446557522, 89.2445519567)):
            Circle(F10_R)
    extrude(amount=F11_DEPTH)


with BuildPart() as f11l:
    # F10 (on offset) → F11, piece 12 (new body)
    with BuildSketch(Plane.XY.offset(38.1)):
        with Locations((121.3446557522, 162.4365597963)):
            Circle(F10_R)
    extrude(amount=F11_DEPTH)


solid = Compound([f2.part, f6.part, f6b.part, f6c.part, f6d.part, f6e.part, f6f.part, f9.part, f9b.part, f9c.part, f11.part, f11b.part, f11c.part, f11d.part, f11e.part, f11f.part, f11g.part, f11h.part, f11i.part, f11j.part, f11k.part, f11l.part])
